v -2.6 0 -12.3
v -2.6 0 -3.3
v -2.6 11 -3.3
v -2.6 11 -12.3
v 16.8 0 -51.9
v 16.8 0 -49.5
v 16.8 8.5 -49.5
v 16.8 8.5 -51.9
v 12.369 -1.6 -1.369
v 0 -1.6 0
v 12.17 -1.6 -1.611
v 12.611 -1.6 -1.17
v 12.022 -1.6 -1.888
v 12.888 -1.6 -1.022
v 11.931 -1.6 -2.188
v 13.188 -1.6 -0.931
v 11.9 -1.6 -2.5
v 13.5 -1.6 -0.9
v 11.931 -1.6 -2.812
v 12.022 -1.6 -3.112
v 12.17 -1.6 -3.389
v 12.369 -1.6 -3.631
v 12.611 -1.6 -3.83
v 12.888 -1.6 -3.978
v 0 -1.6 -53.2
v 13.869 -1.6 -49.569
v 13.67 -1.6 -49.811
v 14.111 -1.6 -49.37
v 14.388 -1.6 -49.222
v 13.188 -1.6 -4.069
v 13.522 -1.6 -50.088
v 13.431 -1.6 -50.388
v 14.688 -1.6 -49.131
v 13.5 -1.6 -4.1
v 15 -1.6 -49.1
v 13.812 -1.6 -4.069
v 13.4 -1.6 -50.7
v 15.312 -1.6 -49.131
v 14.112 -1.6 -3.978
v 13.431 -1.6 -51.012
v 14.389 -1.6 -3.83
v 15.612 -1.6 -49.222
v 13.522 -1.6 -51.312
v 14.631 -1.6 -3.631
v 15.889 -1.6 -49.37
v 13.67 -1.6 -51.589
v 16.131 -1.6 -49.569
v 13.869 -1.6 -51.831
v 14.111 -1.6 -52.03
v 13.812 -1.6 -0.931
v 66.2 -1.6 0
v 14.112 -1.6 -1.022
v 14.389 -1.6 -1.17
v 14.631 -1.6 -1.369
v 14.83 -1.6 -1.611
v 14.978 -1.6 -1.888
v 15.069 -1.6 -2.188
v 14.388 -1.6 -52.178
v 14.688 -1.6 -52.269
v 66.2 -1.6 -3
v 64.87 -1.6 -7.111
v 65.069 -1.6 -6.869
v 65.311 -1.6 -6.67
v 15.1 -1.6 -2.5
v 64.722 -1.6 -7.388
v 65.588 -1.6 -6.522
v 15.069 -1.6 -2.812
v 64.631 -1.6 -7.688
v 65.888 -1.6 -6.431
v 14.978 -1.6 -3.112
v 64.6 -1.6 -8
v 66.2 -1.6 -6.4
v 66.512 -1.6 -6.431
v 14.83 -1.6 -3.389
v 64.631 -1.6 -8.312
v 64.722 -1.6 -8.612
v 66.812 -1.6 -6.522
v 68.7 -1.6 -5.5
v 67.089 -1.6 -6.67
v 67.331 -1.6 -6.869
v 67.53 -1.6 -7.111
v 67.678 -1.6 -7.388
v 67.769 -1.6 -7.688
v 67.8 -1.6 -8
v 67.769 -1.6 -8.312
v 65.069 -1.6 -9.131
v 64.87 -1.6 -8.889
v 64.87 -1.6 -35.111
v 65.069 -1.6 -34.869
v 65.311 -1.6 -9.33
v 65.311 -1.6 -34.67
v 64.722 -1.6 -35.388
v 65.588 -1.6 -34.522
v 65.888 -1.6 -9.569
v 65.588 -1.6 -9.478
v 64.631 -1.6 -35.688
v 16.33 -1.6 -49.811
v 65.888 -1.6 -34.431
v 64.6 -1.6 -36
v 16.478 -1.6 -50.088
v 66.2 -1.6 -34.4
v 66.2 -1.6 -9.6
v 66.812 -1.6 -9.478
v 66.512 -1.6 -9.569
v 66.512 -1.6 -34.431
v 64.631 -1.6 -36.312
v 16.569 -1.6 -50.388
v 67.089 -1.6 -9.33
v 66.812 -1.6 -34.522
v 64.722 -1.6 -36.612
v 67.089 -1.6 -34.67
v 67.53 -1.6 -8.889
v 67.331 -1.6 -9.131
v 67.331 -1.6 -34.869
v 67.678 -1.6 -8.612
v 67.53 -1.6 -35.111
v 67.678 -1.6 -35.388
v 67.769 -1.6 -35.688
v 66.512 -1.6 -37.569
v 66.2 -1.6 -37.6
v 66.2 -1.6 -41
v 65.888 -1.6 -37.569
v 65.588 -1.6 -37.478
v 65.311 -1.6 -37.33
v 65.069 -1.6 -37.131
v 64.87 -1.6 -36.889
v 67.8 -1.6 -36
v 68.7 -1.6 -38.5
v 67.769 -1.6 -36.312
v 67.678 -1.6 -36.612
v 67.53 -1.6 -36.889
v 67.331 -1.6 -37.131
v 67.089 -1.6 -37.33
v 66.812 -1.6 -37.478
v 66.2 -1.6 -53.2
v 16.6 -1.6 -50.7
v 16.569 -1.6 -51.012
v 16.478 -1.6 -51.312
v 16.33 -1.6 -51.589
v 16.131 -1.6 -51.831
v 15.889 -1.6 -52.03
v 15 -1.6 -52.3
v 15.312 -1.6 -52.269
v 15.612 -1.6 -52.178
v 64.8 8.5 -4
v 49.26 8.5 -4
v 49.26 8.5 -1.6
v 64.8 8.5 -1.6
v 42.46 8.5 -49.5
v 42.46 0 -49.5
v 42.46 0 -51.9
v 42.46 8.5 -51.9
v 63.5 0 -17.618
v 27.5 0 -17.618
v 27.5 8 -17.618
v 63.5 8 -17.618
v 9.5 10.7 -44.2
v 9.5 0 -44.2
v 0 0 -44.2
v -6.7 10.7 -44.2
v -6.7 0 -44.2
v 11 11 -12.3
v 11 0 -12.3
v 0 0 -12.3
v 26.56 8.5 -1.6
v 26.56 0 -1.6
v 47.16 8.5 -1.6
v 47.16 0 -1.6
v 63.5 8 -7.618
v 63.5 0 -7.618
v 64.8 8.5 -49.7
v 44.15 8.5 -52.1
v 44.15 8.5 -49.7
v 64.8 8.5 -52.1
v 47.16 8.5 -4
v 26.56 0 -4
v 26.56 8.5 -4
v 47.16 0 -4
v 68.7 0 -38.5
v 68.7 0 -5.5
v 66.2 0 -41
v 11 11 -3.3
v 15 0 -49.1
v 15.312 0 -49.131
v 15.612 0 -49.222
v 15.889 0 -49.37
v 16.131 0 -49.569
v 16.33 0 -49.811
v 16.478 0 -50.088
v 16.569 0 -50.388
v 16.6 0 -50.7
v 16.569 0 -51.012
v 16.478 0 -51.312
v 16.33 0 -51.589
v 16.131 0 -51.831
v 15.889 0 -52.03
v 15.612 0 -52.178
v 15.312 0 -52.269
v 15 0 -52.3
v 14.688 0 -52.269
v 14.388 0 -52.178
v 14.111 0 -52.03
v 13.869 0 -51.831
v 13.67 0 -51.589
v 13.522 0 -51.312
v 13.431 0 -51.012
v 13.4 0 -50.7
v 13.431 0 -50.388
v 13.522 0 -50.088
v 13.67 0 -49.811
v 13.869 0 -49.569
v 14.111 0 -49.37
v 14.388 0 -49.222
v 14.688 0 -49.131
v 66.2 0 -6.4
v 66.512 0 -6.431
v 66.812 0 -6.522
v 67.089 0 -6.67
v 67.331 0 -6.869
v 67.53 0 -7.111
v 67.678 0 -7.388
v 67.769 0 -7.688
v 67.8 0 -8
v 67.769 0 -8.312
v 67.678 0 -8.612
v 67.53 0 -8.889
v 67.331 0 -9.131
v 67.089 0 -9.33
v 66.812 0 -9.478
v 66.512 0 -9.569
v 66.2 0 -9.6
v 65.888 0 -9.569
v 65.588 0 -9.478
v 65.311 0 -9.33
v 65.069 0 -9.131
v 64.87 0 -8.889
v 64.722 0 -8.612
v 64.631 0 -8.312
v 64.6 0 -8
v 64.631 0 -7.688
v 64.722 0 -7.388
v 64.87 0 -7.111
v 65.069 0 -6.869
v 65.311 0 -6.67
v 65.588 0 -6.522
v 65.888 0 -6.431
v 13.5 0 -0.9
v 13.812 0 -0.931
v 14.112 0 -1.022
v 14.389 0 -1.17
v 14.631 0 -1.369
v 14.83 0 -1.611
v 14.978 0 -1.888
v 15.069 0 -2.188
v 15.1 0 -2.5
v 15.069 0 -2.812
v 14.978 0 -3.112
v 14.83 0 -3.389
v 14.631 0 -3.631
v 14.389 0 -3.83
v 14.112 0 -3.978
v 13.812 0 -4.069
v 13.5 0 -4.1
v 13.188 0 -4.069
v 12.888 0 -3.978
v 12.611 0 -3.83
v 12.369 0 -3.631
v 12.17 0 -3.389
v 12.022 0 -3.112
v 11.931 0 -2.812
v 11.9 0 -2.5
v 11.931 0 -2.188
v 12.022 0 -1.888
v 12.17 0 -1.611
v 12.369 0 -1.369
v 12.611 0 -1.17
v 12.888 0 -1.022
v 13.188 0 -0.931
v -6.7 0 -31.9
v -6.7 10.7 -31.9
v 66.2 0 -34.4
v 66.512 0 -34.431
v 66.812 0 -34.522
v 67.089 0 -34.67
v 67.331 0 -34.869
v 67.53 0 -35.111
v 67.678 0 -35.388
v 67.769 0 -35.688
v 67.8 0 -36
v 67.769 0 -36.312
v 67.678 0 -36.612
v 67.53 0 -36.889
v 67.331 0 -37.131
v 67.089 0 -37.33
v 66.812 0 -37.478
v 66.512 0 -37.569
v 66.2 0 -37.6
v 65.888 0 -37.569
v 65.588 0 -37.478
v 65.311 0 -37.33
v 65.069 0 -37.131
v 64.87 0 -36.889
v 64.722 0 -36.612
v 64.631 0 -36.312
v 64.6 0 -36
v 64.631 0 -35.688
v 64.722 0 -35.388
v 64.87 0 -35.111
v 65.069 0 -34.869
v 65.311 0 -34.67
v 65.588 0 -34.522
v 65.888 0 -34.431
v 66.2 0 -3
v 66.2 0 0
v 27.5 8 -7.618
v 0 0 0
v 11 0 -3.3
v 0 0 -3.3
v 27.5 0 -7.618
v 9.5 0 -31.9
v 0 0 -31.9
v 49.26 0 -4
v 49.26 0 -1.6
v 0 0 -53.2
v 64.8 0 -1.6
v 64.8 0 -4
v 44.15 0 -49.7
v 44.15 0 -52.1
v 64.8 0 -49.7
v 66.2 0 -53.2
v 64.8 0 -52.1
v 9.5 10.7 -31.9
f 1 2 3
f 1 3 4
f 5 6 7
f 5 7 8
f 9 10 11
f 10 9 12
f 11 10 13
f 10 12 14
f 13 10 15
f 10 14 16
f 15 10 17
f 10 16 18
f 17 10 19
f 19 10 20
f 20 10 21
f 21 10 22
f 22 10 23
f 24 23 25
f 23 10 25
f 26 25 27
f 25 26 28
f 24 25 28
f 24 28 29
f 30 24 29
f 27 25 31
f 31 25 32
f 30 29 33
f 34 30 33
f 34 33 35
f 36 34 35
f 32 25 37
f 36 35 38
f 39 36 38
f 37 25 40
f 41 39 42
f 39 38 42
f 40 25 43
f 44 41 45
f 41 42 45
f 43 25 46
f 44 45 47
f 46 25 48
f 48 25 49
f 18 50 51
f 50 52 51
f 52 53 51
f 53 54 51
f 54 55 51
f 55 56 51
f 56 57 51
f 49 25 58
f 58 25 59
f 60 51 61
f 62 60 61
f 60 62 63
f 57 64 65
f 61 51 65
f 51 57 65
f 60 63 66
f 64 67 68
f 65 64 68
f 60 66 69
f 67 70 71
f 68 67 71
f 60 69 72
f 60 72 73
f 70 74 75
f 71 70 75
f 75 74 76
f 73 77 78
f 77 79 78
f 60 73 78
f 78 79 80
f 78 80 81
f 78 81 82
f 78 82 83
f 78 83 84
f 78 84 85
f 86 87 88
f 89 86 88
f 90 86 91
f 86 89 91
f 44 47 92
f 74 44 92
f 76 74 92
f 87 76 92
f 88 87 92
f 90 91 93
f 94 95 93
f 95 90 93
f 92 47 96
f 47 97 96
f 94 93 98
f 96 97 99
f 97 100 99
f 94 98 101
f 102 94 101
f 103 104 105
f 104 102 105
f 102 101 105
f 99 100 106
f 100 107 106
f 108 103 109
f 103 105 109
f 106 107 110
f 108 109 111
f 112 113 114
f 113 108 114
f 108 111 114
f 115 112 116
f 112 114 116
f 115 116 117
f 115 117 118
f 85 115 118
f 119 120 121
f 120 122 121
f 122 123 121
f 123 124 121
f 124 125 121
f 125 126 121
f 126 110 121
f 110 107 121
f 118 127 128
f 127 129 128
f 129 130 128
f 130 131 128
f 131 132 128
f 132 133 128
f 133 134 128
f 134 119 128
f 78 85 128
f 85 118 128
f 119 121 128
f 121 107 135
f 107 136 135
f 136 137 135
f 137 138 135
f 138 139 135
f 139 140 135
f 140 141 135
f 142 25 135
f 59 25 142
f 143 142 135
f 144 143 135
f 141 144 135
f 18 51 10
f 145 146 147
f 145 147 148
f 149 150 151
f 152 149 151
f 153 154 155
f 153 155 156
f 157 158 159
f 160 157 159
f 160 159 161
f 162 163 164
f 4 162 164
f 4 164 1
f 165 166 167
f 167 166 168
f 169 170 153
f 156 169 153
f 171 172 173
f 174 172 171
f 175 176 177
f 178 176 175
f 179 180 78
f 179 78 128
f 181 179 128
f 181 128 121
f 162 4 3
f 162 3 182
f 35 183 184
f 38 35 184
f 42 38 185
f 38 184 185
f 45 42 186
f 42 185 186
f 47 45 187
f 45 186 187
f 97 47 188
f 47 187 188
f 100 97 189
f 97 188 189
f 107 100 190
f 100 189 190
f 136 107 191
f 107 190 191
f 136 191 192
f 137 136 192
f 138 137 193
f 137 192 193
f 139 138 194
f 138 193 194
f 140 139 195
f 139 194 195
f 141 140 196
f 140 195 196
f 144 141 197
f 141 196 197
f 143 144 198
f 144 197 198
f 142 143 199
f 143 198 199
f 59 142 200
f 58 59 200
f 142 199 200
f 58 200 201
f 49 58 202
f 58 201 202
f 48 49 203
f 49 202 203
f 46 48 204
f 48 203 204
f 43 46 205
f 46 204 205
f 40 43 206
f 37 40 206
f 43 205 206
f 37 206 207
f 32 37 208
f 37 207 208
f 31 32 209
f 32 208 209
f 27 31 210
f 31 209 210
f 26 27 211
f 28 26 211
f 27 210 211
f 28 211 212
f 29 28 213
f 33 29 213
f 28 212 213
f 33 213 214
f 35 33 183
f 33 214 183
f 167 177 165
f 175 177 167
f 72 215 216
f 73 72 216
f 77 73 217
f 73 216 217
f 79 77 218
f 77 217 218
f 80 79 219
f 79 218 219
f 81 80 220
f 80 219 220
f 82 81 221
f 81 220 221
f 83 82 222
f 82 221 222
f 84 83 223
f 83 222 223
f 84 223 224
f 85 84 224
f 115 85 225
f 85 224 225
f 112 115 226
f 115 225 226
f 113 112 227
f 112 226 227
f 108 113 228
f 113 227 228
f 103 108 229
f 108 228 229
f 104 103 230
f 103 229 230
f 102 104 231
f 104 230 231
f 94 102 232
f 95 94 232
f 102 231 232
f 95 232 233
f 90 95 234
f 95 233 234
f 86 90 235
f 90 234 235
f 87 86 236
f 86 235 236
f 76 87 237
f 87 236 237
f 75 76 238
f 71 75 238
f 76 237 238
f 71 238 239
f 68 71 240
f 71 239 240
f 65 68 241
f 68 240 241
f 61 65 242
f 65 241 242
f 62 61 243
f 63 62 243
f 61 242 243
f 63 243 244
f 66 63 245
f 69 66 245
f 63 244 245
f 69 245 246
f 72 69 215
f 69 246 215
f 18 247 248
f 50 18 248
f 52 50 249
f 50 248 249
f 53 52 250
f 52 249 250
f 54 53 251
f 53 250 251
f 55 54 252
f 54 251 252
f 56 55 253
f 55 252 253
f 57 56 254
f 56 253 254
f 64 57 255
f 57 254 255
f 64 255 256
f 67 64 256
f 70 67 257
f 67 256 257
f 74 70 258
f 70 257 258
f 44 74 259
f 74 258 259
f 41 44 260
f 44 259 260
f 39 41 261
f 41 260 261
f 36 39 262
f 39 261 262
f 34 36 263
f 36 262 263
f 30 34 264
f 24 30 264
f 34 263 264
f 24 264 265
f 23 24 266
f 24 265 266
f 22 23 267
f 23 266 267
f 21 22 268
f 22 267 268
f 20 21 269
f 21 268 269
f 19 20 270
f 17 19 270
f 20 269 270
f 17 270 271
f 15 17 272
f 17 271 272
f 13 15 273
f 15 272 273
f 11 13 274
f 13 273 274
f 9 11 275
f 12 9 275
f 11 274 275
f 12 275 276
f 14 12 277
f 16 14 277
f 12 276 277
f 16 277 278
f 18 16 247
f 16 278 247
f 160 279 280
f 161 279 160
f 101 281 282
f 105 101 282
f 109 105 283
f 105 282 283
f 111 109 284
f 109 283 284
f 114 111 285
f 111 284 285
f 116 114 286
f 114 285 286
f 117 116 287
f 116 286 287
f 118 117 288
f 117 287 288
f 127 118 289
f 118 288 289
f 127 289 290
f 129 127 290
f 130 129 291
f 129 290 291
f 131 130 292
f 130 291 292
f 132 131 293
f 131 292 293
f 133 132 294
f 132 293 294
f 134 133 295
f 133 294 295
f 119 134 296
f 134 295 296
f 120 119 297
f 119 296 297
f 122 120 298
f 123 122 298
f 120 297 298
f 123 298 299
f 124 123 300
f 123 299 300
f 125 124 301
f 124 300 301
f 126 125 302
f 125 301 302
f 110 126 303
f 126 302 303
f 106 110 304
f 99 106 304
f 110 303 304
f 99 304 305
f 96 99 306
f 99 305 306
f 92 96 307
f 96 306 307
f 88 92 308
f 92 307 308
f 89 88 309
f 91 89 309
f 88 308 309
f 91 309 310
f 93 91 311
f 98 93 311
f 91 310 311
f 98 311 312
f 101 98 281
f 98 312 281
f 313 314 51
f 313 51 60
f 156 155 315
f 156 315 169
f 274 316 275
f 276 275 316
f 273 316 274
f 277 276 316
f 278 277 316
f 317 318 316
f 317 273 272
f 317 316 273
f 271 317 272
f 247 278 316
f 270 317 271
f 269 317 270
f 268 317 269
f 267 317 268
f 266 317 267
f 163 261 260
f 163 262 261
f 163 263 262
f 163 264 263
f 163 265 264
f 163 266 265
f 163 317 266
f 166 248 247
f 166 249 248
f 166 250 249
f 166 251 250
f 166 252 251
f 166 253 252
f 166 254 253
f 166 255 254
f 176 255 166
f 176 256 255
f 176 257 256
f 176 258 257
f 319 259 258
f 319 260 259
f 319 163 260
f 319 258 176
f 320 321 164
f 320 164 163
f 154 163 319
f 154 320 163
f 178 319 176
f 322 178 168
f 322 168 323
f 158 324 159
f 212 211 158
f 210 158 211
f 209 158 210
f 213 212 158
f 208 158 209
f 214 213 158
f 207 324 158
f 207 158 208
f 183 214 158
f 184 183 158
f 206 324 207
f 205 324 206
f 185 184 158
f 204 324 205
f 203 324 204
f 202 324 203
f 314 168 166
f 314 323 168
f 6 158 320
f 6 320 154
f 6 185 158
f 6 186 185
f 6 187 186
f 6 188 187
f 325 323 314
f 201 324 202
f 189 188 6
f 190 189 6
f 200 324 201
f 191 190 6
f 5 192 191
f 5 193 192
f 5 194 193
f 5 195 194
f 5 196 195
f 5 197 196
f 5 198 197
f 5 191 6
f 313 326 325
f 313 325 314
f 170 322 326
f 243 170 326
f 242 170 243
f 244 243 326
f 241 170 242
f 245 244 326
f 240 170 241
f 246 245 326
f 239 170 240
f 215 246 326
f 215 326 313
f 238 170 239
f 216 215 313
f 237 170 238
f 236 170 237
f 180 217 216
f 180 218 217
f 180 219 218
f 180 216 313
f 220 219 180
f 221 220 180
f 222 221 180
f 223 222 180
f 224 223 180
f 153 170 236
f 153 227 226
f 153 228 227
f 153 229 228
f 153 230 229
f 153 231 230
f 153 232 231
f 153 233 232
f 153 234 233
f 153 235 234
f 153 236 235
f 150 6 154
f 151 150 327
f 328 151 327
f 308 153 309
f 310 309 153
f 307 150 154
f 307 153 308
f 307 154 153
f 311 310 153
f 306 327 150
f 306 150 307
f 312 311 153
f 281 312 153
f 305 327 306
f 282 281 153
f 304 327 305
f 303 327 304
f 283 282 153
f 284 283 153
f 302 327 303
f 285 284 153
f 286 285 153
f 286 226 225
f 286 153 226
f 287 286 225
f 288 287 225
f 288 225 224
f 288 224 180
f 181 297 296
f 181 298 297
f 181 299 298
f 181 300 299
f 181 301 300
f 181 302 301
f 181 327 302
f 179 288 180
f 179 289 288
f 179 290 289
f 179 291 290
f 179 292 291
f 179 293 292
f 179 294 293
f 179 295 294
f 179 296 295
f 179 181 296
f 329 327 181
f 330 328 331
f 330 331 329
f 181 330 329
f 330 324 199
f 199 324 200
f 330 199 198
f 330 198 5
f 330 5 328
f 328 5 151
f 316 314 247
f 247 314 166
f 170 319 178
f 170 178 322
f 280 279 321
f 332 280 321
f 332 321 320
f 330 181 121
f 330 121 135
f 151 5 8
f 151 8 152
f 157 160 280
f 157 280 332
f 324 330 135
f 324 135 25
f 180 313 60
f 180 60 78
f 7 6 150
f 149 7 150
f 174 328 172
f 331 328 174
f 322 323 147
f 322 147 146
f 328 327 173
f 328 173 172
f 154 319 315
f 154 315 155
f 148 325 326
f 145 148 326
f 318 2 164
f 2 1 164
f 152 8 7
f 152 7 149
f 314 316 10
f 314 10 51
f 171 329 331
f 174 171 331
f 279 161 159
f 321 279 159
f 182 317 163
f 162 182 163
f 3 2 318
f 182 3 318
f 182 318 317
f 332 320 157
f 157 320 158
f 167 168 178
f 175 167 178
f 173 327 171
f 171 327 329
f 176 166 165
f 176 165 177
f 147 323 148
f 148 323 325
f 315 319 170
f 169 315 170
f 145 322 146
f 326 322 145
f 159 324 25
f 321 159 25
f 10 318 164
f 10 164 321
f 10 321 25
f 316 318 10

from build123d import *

# Parameters (mm, degrees)
SKETCH1_R           = 1.6
BOSS_EXTRUDE1_DEPTH = 1.6
SKETCH1_3_W         = 16.2
SKETCH1_3_H         = 12.3
BOSS_EXTRUDE2_DEPTH = 10.7
SKETCH1_4_W         = 13.6
SKETCH1_4_H         = 9
BOSS_EXTRUDE3_DEPTH = 11
SKETCH1_5_W         = 36
SKETCH1_5_H         = 10
BOSS_EXTRUDE4_DEPTH = 8
SKETCH1_6_W         = 25.66
SKETCH1_6_H         = 2.4
SKETCH1_6_W_2       = 20.65
SKETCH1_6_W_3       = 20.6
SKETCH1_6_W_4       = 15.54
BOSS_EXTRUDE5_DEPTH = 8.5


with BuildPart() as part:
    # Sketch1 → Boss-Extrude1 (new body)
    with BuildSketch(Plane(origin=(0, 0, 0), x_dir=(1, 0, 0), z_dir=(0, 1, 0))):
        Polygon((68.7, 38.5), (66.2, 41), (66.2, 53.2), (0, 53.2), (0, 0), (66.2, 0), (66.2, 3), (68.7, 5.5), align=None)
        with Locations((13.5, 2.5)):
            Circle(SKETCH1_R, mode=Mode.SUBTRACT)
        with Locations((66.2, 8)):
            Circle(SKETCH1_R, mode=Mode.SUBTRACT)
        with Locations((15, 50.7)):
            Circle(SKETCH1_R, mode=Mode.SUBTRACT)
        with Locations((66.2, 36)):
            Circle(SKETCH1_R, mode=Mode.SUBTRACT)
    extrude(amount=-BOSS_EXTRUDE1_DEPTH)

    # Sketch1<3> → Boss-Extrude2 (add)
    with BuildSketch(Plane(origin=(0, 0, 0), x_dir=(1, 0, 0), z_dir=(0, 1, 0))):
        with Locations((1.4, 38.05)):
            Rectangle(SKETCH1_3_W, SKETCH1_3_H)
    extrude(amount=BOSS_EXTRUDE2_DEPTH)

    # Sketch1<4> → Boss-Extrude3 (add)
    with BuildSketch(Plane(origin=(0, 0, 0), x_dir=(1, 0, 0), z_dir=(0, 1, 0))):
        with Locations((4.2, 7.8)):
            Rectangle(SKETCH1_4_W, SKETCH1_4_H)
    extrude(amount=BOSS_EXTRUDE3_DEPTH)

    # Sketch1<5> → Boss-Extrude4 (add)
    with BuildSketch(Plane(origin=(0, 0, 0), x_dir=(1, 0, 0), z_dir=(0, 1, 0))):
        with Locations((45.5, 12.617620005)):
            Rectangle(SKETCH1_5_W, SKETCH1_5_H)
    extrude(amount=BOSS_EXTRUDE4_DEPTH)

    # Sketch1<6> → Boss-Extrude5 (add)
    with BuildSketch(Plane(origin=(0, 0, 0), x_dir=(1, 0, 0), z_dir=(0, 1, 0))):
        with Locations((29.63, 50.7)):
            Rectangle(SKETCH1_6_W, SKETCH1_6_H)
        with Locations((54.475, 50.9)):
            Rectangle(SKETCH1_6_W_2, SKETCH1_6_H)
        with Locations((36.86, 2.8)):
            Rectangle(SKETCH1_6_W_3, SKETCH1_6_H)
        with Locations((57.03, 2.8)):
            Rectangle(SKETCH1_6_W_4, SKETCH1_6_H)
    extrude(amount=BOSS_EXTRUDE5_DEPTH)


solid = part.part
